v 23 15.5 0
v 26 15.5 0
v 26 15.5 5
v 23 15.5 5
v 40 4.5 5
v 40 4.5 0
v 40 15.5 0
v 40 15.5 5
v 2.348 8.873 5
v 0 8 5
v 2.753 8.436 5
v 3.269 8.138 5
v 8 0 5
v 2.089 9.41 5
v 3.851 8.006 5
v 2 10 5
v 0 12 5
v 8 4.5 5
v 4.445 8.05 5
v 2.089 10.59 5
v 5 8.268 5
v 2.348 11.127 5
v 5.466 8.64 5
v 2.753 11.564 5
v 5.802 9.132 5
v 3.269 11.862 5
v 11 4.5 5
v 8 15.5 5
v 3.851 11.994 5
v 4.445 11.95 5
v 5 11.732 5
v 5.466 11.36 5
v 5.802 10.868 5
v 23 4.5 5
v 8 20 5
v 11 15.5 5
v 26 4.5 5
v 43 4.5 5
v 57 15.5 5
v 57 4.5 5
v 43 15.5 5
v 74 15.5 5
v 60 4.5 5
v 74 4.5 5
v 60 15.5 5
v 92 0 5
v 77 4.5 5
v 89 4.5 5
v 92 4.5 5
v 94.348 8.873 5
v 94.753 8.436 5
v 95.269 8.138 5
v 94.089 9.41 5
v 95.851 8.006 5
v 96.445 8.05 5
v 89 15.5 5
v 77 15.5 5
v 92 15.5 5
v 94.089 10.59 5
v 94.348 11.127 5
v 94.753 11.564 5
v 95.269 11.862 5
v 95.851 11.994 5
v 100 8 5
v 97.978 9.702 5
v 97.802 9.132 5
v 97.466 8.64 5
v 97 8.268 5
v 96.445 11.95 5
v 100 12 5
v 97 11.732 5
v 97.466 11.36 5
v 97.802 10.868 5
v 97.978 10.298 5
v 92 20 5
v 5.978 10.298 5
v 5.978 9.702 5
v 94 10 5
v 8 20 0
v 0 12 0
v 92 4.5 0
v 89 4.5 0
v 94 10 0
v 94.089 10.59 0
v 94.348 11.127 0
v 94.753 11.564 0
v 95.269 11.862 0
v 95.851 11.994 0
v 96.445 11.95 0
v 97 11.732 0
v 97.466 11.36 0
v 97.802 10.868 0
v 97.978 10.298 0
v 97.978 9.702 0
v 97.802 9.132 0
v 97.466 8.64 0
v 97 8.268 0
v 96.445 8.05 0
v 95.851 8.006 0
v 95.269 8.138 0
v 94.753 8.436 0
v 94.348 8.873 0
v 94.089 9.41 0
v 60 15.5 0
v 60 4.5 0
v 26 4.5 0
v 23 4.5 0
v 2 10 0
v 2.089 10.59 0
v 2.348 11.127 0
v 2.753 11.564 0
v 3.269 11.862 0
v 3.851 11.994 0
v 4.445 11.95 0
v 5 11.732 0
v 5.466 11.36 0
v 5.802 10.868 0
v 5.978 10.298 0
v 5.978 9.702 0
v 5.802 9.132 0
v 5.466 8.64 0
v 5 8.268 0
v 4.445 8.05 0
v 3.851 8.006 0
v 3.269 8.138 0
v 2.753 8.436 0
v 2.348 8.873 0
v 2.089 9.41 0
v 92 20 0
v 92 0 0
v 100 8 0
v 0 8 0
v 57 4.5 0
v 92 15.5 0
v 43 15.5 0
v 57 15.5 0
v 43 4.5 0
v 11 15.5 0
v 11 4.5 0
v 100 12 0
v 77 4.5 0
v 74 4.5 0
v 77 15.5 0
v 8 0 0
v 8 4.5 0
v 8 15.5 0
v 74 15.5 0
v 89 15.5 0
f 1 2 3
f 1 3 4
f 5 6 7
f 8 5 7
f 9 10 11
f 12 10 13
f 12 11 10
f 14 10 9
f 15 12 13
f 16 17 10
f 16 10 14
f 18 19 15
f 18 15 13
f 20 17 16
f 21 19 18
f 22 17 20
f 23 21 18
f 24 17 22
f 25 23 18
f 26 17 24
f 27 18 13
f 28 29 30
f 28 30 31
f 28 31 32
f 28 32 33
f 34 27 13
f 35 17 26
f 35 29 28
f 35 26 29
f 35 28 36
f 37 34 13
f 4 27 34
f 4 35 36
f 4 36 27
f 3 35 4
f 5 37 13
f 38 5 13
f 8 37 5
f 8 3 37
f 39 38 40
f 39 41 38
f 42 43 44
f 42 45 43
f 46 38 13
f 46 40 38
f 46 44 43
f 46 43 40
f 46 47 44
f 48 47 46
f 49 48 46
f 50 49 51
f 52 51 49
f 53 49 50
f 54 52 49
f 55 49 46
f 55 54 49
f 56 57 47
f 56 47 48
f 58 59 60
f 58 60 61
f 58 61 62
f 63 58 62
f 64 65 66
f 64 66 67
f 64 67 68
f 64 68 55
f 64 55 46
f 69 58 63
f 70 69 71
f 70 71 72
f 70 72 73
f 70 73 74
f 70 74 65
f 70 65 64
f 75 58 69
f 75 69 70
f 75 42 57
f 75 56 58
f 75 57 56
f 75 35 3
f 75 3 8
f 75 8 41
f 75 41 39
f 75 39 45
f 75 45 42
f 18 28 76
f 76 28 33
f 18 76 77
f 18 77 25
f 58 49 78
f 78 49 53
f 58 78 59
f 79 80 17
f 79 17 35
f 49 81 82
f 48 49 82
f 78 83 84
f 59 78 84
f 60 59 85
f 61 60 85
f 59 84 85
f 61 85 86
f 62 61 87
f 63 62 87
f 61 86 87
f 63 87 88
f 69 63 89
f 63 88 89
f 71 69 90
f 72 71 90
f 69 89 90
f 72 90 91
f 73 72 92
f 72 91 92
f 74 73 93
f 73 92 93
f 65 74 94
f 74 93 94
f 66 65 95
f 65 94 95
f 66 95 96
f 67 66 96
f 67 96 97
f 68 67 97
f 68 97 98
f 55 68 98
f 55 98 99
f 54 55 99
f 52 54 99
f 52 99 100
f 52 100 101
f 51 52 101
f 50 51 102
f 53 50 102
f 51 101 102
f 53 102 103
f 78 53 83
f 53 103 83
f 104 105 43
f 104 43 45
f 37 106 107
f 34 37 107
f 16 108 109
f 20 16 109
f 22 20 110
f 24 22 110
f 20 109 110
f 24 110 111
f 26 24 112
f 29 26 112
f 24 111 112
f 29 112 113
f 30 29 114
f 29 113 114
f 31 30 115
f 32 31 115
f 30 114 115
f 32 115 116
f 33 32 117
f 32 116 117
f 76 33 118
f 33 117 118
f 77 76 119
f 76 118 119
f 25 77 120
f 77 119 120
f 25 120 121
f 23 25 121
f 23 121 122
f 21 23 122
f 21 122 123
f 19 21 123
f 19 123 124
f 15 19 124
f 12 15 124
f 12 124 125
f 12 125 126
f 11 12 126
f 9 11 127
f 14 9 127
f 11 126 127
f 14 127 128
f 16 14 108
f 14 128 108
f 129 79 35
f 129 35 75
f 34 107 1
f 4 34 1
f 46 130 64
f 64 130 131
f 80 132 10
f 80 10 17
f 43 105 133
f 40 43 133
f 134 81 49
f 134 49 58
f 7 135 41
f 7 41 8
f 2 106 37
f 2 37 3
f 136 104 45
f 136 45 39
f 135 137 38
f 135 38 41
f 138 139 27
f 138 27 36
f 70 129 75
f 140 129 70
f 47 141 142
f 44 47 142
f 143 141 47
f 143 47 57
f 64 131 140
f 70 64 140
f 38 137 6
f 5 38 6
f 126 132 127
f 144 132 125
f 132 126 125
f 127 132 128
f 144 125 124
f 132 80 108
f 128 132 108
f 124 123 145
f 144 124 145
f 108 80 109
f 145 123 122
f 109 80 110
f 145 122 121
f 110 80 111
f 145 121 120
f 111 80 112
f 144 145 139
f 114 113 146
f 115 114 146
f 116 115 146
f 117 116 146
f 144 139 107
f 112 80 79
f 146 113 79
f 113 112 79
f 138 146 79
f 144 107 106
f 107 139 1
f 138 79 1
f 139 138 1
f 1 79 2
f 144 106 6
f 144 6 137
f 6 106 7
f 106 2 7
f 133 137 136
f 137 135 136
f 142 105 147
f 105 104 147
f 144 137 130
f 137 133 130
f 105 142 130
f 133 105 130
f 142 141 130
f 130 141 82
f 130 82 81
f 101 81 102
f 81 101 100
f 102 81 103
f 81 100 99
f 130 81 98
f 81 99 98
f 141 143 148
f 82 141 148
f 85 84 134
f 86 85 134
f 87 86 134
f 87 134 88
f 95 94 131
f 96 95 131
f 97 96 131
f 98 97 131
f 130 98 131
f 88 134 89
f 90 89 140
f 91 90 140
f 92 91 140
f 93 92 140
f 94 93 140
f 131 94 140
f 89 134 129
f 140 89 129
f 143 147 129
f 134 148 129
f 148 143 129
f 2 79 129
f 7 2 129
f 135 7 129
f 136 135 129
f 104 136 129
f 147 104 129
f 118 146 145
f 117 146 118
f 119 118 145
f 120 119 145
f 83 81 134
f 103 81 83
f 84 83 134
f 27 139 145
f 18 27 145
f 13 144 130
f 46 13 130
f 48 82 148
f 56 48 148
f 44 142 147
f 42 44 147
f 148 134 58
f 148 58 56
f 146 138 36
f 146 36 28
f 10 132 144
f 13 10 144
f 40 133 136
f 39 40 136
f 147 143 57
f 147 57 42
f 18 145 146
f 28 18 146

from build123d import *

# Parameters (mm, degrees)
SKETCH1_W           = 100
SKETCH1_H           = 20
BOSS_EXTRUDE1_DEPTH = 5
SKETCH2_R           = 2
SKETCH2_W           = 3
SKETCH2_H           = 11
CUT_EXTRUDE1_DEPTH  = 5
CUT_EXTRUDE2_DEPTH  = 5


with BuildPart() as part:
    # Sketch1 → Boss-Extrude1 (new body)
    with BuildSketch(Plane.XY):
        with Locations((50, 10)):
            Rectangle(SKETCH1_W, SKETCH1_H)
    extrude(amount=BOSS_EXTRUDE1_DEPTH)

    # Sketch2 → Cut-Extrude1 (cut)
    with BuildSketch(Plane(origin=(0, 0, 0), x_dir=(-1, 0, 0), z_dir=(0, 0, -1))):
        with Locations((-96, 10)):
            Circle(SKETCH2_R)
        with Locations((-4, 10)):
            Circle(SKETCH2_R)
        with Locations((-90.5, 10)):
            Rectangle(SKETCH2_W, SKETCH2_H)
        with Locations((-75.5, 10)):
            Rectangle(SKETCH2_W, SKETCH2_H)
        with Locations((-58.5, 10)):
            Rectangle(SKETCH2_W, SKETCH2_H)
        with Locations((-41.5, 10)):
            Rectangle(SKETCH2_W, SKETCH2_H)
        with Locations((-24.5, 10)):
            Rectangle(SKETCH2_W, SKETCH2_H)
        with Locations((-9.5, 10)):
            Rectangle(SKETCH2_W, SKETCH2_H)
    extrude(amount=-CUT_EXTRUDE1_DEPTH, mode=Mode.SUBTRACT)

    # Sketch3 → Cut-Extrude2 (cut)
    with BuildSketch(Plane(origin=(0, 0, 0), x_dir=(-1, 0, 0), z_dir=(0, 0, -1))):
        Polygon((-92, 20), (-100, 12), (-100, 20), align=None)
        Polygon((-100, 8), (-100, 0), (-92, 0), align=None)
        Polygon((-8, 20), (0, 20), (0, 12), align=None)
        Polygon((0, 8), (-8, 0), (0, 0), align=None)
    extrude(amount=-CUT_EXTRUDE2_DEPTH, mode=Mode.SUBTRACT)


solid = part.part
